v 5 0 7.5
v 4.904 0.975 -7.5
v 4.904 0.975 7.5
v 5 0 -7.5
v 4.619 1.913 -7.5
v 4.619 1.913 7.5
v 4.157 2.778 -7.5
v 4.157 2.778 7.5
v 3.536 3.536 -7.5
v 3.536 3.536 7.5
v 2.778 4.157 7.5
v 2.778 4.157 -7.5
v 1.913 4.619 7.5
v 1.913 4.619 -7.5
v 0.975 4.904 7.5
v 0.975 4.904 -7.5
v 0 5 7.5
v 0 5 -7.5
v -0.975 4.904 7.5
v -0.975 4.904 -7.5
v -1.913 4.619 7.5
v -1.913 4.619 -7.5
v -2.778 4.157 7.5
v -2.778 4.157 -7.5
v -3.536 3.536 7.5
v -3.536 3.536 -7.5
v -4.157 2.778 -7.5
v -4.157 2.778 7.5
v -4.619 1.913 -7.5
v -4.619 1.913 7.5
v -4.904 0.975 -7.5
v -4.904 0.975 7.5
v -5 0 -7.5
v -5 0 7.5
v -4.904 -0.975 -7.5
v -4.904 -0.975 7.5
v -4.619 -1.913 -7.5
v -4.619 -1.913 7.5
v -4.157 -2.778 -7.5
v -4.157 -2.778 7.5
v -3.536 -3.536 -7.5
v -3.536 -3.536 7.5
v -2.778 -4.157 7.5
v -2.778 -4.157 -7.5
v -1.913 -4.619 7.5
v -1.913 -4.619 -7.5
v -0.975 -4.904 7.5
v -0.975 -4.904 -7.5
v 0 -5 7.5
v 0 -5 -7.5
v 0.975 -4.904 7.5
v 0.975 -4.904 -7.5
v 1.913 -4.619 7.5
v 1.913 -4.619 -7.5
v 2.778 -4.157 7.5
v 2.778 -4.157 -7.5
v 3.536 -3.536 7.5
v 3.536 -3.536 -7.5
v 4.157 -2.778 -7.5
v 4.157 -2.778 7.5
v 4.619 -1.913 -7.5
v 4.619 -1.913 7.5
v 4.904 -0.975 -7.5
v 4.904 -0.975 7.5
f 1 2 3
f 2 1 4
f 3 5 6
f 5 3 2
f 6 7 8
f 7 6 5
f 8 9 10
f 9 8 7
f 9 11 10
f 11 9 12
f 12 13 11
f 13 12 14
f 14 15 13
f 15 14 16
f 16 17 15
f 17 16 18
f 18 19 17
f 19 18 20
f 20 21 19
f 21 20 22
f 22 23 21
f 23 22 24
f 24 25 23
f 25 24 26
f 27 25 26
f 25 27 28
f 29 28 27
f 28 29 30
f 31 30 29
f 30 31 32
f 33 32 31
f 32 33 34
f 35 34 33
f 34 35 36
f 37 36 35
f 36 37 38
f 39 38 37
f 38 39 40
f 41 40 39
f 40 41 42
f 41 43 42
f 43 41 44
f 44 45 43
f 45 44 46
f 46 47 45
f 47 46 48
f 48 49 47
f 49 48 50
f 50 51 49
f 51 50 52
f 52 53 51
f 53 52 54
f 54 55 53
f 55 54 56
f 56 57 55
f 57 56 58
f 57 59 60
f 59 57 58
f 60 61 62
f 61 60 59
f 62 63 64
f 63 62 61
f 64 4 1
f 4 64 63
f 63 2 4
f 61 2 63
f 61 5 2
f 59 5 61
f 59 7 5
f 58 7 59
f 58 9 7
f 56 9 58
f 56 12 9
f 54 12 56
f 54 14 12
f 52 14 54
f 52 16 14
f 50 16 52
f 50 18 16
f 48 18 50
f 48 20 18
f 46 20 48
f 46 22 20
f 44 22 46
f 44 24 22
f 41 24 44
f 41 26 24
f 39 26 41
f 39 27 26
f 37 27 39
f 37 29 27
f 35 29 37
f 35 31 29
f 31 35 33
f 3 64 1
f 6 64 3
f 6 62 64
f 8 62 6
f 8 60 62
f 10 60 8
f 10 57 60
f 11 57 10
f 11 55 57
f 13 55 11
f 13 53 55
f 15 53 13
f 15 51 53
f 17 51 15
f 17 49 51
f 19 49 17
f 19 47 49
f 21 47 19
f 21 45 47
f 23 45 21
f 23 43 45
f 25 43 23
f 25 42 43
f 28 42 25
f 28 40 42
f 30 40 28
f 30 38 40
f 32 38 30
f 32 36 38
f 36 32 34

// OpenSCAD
// Define the number of fragments for round shapes
// The higher the number, the smoother the rounding
$fn = 32;

// Let's create a cylinder
// All units are given in millimeters
// Cylinder with 10mm diameter and 15mm height
cylinder(d = 10, h = 15, center = true);
